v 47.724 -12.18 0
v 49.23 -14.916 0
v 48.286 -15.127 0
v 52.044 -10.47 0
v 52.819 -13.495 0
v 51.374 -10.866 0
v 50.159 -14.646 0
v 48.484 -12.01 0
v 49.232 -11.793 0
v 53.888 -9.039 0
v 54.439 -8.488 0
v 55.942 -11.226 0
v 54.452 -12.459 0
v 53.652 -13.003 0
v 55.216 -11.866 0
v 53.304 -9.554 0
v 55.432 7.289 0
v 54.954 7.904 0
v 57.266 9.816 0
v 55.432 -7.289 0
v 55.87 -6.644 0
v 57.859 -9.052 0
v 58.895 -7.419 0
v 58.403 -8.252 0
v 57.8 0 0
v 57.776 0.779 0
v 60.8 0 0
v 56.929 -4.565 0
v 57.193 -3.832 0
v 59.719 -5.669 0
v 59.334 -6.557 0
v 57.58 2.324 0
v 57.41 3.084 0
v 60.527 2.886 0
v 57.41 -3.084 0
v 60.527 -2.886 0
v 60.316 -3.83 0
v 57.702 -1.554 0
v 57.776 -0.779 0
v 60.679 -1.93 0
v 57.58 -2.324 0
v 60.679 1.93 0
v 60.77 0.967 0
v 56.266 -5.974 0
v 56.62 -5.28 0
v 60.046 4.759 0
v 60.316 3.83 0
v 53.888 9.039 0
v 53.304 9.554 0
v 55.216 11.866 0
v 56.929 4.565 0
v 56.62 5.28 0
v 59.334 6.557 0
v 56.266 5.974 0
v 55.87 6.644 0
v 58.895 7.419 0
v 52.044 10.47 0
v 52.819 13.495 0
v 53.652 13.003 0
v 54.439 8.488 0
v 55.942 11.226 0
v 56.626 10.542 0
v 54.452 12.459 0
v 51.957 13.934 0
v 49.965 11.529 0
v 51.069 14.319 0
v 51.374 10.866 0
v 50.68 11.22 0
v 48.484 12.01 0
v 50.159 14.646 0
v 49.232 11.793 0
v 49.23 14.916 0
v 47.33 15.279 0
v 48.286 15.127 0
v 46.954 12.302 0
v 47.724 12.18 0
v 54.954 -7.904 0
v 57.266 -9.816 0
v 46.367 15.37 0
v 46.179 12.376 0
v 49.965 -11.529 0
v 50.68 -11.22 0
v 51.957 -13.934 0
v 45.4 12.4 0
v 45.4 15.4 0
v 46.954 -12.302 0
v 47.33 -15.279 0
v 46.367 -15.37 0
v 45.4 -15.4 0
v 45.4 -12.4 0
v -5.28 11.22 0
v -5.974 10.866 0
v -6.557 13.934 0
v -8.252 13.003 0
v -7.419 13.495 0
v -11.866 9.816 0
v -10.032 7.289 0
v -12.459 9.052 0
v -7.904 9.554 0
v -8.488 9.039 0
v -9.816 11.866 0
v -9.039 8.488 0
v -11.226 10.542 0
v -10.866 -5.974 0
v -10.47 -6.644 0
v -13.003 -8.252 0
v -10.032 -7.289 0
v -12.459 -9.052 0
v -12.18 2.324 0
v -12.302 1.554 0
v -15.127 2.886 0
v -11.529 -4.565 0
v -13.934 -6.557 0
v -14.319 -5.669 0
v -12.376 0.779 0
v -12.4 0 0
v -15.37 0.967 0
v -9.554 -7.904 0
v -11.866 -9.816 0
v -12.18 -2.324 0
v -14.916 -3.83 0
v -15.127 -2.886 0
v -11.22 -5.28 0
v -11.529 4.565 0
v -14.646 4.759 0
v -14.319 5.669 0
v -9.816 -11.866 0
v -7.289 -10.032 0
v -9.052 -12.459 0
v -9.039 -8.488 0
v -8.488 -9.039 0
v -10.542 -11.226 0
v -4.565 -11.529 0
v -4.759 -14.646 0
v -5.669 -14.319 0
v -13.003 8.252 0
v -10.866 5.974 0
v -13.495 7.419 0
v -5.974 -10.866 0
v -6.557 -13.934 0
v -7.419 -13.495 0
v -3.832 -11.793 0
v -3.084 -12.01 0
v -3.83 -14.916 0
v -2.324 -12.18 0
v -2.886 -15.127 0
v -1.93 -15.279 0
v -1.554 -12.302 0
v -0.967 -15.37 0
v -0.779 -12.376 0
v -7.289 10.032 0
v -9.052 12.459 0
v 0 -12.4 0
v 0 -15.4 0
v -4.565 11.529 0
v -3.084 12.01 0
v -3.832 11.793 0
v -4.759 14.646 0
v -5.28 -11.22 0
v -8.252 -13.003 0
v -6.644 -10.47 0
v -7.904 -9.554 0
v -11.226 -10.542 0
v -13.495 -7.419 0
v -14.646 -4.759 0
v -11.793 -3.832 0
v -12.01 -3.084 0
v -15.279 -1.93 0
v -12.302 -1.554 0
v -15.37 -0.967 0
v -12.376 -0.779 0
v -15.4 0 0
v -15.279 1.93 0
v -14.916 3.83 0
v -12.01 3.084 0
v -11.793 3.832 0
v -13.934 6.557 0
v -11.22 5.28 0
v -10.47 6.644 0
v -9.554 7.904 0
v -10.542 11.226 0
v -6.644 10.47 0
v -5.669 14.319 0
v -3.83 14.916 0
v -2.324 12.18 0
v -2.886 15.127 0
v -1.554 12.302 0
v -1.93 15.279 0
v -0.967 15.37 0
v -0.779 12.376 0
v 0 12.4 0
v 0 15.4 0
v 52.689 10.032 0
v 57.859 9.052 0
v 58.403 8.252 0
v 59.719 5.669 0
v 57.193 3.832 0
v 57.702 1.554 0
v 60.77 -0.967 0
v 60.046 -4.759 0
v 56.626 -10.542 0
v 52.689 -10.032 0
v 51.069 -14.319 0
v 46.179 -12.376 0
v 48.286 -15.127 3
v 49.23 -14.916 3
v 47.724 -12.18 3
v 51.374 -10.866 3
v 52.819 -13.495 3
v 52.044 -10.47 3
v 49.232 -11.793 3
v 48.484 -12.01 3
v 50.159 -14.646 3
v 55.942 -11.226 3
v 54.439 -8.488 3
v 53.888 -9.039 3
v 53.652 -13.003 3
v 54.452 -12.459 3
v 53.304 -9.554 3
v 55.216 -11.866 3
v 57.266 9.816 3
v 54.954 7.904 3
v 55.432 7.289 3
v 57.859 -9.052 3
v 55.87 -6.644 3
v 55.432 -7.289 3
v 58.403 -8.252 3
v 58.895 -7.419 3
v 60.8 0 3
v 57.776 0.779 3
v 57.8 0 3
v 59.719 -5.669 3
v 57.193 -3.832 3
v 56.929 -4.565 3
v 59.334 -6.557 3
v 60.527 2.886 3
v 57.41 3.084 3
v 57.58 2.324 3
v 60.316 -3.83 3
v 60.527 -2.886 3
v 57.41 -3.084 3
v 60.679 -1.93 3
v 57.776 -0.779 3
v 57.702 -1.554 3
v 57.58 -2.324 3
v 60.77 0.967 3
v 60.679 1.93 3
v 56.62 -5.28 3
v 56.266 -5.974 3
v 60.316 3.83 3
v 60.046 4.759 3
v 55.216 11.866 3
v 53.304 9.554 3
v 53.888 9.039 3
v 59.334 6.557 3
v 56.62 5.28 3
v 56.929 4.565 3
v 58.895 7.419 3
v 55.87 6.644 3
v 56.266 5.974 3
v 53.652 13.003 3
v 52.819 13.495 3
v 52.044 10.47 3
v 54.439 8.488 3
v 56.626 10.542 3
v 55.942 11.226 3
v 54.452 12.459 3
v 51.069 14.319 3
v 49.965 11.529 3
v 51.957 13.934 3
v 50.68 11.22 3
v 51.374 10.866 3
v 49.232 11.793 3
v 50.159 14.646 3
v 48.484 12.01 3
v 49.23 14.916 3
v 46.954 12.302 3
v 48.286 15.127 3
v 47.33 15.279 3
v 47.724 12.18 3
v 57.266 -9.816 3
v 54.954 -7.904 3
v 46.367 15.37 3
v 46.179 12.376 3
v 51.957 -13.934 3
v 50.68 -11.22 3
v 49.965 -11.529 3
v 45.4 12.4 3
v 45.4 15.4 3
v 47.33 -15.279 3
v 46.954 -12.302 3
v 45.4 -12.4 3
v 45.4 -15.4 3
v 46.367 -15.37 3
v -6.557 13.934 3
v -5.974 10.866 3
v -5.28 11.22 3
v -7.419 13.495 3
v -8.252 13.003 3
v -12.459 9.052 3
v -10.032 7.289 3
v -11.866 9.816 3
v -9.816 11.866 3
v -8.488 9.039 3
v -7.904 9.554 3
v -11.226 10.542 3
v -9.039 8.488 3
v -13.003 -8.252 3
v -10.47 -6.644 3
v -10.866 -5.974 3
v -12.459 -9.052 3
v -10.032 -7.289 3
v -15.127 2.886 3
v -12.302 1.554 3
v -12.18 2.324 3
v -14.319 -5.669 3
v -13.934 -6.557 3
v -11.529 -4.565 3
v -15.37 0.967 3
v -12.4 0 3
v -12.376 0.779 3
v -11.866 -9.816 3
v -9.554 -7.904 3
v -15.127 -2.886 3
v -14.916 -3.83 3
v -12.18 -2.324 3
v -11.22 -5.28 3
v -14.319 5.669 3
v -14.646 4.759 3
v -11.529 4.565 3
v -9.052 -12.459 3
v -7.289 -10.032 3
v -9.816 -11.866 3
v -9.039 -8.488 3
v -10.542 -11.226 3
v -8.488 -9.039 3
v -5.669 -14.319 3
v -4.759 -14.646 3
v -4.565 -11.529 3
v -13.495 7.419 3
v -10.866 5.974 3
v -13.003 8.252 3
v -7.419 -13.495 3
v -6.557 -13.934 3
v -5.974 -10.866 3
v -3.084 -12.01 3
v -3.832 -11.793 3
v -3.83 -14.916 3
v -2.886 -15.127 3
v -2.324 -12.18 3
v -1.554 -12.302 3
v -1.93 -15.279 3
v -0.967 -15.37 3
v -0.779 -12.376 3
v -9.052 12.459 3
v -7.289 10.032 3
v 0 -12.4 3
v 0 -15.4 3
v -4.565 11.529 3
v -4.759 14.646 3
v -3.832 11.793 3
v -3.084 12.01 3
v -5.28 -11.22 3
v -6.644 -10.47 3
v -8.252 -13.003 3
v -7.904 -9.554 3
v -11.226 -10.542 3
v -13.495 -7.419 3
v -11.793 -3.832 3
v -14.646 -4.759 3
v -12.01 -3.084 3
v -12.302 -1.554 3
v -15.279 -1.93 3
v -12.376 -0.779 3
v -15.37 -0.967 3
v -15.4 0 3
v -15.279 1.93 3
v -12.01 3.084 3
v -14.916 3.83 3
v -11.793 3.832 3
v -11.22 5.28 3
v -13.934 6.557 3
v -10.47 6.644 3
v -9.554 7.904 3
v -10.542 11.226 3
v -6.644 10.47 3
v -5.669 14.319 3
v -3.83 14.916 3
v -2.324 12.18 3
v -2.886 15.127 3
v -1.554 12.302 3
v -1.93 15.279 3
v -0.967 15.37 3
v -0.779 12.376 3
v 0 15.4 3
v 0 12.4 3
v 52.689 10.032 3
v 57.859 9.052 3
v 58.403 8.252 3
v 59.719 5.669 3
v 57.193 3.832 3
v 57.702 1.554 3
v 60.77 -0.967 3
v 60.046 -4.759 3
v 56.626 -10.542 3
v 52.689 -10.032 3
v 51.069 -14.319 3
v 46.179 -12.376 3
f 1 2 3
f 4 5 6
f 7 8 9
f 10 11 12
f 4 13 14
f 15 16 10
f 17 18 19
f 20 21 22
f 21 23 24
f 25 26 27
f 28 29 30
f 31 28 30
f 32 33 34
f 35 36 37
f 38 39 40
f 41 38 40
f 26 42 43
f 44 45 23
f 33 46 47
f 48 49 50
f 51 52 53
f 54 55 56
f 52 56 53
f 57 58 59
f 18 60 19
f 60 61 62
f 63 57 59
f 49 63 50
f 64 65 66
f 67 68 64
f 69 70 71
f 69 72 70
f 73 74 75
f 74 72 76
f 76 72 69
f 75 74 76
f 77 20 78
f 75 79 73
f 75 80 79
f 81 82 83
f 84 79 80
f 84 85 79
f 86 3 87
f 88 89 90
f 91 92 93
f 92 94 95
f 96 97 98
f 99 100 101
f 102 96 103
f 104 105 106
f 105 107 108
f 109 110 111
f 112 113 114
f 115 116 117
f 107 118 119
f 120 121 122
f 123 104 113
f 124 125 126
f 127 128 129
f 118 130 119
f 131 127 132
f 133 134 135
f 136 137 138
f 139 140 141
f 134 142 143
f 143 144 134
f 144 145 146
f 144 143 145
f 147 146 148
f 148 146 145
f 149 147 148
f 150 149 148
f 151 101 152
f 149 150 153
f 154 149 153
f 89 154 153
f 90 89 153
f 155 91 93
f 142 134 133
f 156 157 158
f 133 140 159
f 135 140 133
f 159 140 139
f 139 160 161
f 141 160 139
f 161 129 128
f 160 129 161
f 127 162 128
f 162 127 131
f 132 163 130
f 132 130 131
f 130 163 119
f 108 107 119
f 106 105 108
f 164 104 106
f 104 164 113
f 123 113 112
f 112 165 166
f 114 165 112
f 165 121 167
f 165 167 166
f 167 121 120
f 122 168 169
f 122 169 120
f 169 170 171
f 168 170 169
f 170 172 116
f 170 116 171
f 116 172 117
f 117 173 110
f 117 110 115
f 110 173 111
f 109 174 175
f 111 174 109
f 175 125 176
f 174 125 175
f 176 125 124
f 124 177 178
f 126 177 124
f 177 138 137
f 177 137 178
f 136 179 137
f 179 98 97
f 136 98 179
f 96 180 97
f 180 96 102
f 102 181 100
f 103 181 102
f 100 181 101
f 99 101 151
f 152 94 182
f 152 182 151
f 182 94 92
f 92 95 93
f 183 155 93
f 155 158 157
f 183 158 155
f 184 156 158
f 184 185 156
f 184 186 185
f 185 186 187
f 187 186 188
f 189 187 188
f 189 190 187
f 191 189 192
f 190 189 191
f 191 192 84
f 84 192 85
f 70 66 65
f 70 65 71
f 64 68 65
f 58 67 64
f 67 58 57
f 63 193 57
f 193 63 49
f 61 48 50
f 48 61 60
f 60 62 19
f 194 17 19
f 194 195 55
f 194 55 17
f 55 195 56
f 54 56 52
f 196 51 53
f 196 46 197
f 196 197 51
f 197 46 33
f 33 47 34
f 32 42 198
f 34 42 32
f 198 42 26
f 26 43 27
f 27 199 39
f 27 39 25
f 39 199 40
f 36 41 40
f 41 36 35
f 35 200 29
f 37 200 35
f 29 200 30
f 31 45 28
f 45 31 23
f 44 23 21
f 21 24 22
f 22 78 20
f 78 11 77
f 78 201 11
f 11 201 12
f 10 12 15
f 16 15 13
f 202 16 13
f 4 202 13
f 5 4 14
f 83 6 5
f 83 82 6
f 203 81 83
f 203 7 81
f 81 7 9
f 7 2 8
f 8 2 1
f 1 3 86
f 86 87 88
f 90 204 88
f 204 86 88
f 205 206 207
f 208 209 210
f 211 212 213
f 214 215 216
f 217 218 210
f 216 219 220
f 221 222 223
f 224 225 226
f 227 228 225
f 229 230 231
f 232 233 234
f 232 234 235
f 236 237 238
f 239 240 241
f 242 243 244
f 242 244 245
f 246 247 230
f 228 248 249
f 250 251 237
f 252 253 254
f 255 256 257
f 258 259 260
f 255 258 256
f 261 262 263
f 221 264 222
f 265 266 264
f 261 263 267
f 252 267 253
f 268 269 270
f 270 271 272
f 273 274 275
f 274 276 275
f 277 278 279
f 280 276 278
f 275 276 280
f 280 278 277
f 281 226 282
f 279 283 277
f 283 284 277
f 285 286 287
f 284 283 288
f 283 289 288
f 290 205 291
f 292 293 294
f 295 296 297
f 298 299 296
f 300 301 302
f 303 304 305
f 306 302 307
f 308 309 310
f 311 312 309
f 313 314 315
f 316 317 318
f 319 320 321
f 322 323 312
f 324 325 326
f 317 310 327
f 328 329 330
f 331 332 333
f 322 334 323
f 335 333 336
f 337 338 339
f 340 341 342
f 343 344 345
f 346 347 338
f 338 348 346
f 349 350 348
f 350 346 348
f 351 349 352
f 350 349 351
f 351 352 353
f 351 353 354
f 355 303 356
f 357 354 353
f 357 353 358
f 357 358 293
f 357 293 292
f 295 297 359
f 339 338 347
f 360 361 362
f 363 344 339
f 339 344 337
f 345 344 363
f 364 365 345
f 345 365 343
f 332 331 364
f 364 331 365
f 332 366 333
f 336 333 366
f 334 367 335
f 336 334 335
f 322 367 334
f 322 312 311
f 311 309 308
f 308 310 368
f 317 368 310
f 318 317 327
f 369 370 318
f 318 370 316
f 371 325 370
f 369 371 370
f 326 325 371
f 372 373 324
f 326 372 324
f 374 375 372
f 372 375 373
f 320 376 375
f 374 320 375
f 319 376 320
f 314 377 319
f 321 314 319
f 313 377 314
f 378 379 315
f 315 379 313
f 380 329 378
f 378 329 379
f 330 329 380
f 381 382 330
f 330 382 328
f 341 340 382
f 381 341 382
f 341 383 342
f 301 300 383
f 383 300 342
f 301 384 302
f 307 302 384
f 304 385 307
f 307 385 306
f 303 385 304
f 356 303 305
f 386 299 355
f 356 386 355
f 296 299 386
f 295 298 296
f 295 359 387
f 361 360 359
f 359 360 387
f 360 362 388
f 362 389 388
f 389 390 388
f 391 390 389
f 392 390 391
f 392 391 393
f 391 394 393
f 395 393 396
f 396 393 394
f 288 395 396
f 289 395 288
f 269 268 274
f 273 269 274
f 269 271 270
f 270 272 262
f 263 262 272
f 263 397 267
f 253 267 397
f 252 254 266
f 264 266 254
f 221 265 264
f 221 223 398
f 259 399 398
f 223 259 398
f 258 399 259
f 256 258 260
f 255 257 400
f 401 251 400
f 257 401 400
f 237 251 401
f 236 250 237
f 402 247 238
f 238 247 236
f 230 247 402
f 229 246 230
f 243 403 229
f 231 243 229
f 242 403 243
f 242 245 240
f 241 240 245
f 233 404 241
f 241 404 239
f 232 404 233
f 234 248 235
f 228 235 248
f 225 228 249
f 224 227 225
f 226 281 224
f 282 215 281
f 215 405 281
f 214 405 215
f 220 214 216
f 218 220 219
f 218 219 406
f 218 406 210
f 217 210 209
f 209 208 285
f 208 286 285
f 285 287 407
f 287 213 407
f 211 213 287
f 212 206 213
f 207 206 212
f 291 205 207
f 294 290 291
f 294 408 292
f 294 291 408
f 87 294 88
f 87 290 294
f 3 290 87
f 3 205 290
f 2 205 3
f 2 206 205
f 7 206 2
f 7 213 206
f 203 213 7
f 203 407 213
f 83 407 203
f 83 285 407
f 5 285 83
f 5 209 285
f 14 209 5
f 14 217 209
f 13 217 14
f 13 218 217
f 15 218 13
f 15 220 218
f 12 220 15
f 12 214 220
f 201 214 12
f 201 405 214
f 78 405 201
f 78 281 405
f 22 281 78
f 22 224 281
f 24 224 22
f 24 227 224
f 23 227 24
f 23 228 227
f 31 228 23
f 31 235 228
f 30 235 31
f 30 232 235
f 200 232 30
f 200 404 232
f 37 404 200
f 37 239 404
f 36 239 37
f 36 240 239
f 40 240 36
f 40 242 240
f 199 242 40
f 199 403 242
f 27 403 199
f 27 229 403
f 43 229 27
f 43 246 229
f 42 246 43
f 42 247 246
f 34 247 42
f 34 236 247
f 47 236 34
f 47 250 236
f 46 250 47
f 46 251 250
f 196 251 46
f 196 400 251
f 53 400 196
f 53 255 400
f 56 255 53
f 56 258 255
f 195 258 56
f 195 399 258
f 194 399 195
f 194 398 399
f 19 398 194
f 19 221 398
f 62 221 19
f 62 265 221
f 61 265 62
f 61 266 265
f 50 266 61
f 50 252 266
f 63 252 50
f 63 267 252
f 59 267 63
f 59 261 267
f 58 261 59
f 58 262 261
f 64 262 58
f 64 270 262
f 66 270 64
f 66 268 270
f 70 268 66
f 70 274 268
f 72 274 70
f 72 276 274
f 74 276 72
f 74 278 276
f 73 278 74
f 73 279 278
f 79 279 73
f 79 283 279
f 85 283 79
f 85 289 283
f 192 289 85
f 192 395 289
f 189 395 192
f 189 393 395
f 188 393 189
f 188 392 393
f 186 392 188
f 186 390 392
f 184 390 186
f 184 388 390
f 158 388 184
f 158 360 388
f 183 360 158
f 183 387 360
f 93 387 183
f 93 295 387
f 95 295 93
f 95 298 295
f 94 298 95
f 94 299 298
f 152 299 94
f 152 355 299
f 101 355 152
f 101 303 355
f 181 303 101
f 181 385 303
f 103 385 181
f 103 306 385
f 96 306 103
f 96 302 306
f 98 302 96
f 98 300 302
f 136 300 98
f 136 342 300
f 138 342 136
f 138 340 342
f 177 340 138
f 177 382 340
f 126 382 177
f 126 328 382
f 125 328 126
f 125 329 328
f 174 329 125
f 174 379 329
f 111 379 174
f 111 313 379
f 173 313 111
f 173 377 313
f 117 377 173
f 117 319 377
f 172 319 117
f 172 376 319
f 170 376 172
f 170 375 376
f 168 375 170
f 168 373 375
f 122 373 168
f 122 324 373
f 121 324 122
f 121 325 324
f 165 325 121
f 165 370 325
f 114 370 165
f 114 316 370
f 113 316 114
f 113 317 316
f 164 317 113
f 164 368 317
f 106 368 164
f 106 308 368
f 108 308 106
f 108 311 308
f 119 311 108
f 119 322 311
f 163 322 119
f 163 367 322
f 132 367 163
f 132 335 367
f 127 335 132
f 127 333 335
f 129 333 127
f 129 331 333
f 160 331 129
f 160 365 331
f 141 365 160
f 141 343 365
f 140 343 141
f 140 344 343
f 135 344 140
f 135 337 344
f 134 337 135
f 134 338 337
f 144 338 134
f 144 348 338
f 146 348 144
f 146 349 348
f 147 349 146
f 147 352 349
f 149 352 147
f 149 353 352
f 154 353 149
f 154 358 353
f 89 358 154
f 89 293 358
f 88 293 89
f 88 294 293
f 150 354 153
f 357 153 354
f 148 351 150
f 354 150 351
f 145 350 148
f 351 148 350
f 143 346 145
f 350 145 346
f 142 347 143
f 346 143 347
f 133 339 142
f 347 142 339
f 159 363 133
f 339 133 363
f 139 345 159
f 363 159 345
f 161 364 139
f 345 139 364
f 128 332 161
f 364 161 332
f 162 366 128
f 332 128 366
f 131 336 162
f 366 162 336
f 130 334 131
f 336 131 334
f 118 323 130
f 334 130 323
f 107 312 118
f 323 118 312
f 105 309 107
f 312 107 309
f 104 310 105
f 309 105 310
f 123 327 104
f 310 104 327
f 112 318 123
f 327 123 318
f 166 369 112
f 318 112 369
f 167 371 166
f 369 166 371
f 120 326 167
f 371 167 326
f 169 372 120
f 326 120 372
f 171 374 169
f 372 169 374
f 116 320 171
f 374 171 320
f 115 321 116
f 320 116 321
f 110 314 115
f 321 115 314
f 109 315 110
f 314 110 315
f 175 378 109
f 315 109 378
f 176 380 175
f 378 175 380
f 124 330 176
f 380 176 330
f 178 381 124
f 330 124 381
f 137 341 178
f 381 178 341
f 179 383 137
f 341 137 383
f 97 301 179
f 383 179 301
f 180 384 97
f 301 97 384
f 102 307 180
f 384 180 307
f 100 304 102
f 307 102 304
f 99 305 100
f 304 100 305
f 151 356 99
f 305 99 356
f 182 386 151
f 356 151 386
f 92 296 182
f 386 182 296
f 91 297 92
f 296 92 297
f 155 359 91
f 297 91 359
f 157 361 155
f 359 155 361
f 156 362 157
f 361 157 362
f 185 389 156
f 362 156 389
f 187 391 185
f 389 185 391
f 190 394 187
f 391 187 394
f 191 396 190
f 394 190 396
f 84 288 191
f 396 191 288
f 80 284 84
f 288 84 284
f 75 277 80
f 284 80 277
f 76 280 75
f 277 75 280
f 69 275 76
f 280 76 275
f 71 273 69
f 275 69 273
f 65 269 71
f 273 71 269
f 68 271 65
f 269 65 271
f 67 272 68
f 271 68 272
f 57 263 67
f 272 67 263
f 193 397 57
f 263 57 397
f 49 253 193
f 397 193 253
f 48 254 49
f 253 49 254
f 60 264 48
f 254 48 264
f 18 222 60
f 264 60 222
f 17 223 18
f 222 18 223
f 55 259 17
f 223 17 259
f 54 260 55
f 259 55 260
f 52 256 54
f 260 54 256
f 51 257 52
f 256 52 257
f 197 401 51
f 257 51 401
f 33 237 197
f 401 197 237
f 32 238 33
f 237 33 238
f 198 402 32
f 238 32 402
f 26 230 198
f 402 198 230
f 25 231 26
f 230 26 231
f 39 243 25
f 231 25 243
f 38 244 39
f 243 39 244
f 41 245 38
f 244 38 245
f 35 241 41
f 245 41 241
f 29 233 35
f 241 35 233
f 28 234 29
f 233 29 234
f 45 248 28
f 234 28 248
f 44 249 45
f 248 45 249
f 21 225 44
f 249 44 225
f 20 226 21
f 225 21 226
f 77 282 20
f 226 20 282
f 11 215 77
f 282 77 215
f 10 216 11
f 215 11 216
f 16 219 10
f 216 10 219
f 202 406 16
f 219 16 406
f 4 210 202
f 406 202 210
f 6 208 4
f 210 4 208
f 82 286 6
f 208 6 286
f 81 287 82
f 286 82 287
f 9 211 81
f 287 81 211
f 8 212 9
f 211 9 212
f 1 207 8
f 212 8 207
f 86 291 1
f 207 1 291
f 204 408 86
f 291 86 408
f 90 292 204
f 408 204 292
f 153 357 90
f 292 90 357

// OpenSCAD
module pill (width, radius) {
  hull() {
  circle(r=radius, $fn=100);
  translate([width - radius * 2, 0, 0]) {
    circle(r=radius, $fn=100);
  }
  }
}

inner_width = 70.2;
inner_radius = 24.8 / 2;

outer_width = inner_width + 6;
outer_radius = inner_radius + 3;

linear_extrude(height=3) {
difference() {
pill(outer_width, outer_radius);
pill(inner_width, inner_radius);
}
}
